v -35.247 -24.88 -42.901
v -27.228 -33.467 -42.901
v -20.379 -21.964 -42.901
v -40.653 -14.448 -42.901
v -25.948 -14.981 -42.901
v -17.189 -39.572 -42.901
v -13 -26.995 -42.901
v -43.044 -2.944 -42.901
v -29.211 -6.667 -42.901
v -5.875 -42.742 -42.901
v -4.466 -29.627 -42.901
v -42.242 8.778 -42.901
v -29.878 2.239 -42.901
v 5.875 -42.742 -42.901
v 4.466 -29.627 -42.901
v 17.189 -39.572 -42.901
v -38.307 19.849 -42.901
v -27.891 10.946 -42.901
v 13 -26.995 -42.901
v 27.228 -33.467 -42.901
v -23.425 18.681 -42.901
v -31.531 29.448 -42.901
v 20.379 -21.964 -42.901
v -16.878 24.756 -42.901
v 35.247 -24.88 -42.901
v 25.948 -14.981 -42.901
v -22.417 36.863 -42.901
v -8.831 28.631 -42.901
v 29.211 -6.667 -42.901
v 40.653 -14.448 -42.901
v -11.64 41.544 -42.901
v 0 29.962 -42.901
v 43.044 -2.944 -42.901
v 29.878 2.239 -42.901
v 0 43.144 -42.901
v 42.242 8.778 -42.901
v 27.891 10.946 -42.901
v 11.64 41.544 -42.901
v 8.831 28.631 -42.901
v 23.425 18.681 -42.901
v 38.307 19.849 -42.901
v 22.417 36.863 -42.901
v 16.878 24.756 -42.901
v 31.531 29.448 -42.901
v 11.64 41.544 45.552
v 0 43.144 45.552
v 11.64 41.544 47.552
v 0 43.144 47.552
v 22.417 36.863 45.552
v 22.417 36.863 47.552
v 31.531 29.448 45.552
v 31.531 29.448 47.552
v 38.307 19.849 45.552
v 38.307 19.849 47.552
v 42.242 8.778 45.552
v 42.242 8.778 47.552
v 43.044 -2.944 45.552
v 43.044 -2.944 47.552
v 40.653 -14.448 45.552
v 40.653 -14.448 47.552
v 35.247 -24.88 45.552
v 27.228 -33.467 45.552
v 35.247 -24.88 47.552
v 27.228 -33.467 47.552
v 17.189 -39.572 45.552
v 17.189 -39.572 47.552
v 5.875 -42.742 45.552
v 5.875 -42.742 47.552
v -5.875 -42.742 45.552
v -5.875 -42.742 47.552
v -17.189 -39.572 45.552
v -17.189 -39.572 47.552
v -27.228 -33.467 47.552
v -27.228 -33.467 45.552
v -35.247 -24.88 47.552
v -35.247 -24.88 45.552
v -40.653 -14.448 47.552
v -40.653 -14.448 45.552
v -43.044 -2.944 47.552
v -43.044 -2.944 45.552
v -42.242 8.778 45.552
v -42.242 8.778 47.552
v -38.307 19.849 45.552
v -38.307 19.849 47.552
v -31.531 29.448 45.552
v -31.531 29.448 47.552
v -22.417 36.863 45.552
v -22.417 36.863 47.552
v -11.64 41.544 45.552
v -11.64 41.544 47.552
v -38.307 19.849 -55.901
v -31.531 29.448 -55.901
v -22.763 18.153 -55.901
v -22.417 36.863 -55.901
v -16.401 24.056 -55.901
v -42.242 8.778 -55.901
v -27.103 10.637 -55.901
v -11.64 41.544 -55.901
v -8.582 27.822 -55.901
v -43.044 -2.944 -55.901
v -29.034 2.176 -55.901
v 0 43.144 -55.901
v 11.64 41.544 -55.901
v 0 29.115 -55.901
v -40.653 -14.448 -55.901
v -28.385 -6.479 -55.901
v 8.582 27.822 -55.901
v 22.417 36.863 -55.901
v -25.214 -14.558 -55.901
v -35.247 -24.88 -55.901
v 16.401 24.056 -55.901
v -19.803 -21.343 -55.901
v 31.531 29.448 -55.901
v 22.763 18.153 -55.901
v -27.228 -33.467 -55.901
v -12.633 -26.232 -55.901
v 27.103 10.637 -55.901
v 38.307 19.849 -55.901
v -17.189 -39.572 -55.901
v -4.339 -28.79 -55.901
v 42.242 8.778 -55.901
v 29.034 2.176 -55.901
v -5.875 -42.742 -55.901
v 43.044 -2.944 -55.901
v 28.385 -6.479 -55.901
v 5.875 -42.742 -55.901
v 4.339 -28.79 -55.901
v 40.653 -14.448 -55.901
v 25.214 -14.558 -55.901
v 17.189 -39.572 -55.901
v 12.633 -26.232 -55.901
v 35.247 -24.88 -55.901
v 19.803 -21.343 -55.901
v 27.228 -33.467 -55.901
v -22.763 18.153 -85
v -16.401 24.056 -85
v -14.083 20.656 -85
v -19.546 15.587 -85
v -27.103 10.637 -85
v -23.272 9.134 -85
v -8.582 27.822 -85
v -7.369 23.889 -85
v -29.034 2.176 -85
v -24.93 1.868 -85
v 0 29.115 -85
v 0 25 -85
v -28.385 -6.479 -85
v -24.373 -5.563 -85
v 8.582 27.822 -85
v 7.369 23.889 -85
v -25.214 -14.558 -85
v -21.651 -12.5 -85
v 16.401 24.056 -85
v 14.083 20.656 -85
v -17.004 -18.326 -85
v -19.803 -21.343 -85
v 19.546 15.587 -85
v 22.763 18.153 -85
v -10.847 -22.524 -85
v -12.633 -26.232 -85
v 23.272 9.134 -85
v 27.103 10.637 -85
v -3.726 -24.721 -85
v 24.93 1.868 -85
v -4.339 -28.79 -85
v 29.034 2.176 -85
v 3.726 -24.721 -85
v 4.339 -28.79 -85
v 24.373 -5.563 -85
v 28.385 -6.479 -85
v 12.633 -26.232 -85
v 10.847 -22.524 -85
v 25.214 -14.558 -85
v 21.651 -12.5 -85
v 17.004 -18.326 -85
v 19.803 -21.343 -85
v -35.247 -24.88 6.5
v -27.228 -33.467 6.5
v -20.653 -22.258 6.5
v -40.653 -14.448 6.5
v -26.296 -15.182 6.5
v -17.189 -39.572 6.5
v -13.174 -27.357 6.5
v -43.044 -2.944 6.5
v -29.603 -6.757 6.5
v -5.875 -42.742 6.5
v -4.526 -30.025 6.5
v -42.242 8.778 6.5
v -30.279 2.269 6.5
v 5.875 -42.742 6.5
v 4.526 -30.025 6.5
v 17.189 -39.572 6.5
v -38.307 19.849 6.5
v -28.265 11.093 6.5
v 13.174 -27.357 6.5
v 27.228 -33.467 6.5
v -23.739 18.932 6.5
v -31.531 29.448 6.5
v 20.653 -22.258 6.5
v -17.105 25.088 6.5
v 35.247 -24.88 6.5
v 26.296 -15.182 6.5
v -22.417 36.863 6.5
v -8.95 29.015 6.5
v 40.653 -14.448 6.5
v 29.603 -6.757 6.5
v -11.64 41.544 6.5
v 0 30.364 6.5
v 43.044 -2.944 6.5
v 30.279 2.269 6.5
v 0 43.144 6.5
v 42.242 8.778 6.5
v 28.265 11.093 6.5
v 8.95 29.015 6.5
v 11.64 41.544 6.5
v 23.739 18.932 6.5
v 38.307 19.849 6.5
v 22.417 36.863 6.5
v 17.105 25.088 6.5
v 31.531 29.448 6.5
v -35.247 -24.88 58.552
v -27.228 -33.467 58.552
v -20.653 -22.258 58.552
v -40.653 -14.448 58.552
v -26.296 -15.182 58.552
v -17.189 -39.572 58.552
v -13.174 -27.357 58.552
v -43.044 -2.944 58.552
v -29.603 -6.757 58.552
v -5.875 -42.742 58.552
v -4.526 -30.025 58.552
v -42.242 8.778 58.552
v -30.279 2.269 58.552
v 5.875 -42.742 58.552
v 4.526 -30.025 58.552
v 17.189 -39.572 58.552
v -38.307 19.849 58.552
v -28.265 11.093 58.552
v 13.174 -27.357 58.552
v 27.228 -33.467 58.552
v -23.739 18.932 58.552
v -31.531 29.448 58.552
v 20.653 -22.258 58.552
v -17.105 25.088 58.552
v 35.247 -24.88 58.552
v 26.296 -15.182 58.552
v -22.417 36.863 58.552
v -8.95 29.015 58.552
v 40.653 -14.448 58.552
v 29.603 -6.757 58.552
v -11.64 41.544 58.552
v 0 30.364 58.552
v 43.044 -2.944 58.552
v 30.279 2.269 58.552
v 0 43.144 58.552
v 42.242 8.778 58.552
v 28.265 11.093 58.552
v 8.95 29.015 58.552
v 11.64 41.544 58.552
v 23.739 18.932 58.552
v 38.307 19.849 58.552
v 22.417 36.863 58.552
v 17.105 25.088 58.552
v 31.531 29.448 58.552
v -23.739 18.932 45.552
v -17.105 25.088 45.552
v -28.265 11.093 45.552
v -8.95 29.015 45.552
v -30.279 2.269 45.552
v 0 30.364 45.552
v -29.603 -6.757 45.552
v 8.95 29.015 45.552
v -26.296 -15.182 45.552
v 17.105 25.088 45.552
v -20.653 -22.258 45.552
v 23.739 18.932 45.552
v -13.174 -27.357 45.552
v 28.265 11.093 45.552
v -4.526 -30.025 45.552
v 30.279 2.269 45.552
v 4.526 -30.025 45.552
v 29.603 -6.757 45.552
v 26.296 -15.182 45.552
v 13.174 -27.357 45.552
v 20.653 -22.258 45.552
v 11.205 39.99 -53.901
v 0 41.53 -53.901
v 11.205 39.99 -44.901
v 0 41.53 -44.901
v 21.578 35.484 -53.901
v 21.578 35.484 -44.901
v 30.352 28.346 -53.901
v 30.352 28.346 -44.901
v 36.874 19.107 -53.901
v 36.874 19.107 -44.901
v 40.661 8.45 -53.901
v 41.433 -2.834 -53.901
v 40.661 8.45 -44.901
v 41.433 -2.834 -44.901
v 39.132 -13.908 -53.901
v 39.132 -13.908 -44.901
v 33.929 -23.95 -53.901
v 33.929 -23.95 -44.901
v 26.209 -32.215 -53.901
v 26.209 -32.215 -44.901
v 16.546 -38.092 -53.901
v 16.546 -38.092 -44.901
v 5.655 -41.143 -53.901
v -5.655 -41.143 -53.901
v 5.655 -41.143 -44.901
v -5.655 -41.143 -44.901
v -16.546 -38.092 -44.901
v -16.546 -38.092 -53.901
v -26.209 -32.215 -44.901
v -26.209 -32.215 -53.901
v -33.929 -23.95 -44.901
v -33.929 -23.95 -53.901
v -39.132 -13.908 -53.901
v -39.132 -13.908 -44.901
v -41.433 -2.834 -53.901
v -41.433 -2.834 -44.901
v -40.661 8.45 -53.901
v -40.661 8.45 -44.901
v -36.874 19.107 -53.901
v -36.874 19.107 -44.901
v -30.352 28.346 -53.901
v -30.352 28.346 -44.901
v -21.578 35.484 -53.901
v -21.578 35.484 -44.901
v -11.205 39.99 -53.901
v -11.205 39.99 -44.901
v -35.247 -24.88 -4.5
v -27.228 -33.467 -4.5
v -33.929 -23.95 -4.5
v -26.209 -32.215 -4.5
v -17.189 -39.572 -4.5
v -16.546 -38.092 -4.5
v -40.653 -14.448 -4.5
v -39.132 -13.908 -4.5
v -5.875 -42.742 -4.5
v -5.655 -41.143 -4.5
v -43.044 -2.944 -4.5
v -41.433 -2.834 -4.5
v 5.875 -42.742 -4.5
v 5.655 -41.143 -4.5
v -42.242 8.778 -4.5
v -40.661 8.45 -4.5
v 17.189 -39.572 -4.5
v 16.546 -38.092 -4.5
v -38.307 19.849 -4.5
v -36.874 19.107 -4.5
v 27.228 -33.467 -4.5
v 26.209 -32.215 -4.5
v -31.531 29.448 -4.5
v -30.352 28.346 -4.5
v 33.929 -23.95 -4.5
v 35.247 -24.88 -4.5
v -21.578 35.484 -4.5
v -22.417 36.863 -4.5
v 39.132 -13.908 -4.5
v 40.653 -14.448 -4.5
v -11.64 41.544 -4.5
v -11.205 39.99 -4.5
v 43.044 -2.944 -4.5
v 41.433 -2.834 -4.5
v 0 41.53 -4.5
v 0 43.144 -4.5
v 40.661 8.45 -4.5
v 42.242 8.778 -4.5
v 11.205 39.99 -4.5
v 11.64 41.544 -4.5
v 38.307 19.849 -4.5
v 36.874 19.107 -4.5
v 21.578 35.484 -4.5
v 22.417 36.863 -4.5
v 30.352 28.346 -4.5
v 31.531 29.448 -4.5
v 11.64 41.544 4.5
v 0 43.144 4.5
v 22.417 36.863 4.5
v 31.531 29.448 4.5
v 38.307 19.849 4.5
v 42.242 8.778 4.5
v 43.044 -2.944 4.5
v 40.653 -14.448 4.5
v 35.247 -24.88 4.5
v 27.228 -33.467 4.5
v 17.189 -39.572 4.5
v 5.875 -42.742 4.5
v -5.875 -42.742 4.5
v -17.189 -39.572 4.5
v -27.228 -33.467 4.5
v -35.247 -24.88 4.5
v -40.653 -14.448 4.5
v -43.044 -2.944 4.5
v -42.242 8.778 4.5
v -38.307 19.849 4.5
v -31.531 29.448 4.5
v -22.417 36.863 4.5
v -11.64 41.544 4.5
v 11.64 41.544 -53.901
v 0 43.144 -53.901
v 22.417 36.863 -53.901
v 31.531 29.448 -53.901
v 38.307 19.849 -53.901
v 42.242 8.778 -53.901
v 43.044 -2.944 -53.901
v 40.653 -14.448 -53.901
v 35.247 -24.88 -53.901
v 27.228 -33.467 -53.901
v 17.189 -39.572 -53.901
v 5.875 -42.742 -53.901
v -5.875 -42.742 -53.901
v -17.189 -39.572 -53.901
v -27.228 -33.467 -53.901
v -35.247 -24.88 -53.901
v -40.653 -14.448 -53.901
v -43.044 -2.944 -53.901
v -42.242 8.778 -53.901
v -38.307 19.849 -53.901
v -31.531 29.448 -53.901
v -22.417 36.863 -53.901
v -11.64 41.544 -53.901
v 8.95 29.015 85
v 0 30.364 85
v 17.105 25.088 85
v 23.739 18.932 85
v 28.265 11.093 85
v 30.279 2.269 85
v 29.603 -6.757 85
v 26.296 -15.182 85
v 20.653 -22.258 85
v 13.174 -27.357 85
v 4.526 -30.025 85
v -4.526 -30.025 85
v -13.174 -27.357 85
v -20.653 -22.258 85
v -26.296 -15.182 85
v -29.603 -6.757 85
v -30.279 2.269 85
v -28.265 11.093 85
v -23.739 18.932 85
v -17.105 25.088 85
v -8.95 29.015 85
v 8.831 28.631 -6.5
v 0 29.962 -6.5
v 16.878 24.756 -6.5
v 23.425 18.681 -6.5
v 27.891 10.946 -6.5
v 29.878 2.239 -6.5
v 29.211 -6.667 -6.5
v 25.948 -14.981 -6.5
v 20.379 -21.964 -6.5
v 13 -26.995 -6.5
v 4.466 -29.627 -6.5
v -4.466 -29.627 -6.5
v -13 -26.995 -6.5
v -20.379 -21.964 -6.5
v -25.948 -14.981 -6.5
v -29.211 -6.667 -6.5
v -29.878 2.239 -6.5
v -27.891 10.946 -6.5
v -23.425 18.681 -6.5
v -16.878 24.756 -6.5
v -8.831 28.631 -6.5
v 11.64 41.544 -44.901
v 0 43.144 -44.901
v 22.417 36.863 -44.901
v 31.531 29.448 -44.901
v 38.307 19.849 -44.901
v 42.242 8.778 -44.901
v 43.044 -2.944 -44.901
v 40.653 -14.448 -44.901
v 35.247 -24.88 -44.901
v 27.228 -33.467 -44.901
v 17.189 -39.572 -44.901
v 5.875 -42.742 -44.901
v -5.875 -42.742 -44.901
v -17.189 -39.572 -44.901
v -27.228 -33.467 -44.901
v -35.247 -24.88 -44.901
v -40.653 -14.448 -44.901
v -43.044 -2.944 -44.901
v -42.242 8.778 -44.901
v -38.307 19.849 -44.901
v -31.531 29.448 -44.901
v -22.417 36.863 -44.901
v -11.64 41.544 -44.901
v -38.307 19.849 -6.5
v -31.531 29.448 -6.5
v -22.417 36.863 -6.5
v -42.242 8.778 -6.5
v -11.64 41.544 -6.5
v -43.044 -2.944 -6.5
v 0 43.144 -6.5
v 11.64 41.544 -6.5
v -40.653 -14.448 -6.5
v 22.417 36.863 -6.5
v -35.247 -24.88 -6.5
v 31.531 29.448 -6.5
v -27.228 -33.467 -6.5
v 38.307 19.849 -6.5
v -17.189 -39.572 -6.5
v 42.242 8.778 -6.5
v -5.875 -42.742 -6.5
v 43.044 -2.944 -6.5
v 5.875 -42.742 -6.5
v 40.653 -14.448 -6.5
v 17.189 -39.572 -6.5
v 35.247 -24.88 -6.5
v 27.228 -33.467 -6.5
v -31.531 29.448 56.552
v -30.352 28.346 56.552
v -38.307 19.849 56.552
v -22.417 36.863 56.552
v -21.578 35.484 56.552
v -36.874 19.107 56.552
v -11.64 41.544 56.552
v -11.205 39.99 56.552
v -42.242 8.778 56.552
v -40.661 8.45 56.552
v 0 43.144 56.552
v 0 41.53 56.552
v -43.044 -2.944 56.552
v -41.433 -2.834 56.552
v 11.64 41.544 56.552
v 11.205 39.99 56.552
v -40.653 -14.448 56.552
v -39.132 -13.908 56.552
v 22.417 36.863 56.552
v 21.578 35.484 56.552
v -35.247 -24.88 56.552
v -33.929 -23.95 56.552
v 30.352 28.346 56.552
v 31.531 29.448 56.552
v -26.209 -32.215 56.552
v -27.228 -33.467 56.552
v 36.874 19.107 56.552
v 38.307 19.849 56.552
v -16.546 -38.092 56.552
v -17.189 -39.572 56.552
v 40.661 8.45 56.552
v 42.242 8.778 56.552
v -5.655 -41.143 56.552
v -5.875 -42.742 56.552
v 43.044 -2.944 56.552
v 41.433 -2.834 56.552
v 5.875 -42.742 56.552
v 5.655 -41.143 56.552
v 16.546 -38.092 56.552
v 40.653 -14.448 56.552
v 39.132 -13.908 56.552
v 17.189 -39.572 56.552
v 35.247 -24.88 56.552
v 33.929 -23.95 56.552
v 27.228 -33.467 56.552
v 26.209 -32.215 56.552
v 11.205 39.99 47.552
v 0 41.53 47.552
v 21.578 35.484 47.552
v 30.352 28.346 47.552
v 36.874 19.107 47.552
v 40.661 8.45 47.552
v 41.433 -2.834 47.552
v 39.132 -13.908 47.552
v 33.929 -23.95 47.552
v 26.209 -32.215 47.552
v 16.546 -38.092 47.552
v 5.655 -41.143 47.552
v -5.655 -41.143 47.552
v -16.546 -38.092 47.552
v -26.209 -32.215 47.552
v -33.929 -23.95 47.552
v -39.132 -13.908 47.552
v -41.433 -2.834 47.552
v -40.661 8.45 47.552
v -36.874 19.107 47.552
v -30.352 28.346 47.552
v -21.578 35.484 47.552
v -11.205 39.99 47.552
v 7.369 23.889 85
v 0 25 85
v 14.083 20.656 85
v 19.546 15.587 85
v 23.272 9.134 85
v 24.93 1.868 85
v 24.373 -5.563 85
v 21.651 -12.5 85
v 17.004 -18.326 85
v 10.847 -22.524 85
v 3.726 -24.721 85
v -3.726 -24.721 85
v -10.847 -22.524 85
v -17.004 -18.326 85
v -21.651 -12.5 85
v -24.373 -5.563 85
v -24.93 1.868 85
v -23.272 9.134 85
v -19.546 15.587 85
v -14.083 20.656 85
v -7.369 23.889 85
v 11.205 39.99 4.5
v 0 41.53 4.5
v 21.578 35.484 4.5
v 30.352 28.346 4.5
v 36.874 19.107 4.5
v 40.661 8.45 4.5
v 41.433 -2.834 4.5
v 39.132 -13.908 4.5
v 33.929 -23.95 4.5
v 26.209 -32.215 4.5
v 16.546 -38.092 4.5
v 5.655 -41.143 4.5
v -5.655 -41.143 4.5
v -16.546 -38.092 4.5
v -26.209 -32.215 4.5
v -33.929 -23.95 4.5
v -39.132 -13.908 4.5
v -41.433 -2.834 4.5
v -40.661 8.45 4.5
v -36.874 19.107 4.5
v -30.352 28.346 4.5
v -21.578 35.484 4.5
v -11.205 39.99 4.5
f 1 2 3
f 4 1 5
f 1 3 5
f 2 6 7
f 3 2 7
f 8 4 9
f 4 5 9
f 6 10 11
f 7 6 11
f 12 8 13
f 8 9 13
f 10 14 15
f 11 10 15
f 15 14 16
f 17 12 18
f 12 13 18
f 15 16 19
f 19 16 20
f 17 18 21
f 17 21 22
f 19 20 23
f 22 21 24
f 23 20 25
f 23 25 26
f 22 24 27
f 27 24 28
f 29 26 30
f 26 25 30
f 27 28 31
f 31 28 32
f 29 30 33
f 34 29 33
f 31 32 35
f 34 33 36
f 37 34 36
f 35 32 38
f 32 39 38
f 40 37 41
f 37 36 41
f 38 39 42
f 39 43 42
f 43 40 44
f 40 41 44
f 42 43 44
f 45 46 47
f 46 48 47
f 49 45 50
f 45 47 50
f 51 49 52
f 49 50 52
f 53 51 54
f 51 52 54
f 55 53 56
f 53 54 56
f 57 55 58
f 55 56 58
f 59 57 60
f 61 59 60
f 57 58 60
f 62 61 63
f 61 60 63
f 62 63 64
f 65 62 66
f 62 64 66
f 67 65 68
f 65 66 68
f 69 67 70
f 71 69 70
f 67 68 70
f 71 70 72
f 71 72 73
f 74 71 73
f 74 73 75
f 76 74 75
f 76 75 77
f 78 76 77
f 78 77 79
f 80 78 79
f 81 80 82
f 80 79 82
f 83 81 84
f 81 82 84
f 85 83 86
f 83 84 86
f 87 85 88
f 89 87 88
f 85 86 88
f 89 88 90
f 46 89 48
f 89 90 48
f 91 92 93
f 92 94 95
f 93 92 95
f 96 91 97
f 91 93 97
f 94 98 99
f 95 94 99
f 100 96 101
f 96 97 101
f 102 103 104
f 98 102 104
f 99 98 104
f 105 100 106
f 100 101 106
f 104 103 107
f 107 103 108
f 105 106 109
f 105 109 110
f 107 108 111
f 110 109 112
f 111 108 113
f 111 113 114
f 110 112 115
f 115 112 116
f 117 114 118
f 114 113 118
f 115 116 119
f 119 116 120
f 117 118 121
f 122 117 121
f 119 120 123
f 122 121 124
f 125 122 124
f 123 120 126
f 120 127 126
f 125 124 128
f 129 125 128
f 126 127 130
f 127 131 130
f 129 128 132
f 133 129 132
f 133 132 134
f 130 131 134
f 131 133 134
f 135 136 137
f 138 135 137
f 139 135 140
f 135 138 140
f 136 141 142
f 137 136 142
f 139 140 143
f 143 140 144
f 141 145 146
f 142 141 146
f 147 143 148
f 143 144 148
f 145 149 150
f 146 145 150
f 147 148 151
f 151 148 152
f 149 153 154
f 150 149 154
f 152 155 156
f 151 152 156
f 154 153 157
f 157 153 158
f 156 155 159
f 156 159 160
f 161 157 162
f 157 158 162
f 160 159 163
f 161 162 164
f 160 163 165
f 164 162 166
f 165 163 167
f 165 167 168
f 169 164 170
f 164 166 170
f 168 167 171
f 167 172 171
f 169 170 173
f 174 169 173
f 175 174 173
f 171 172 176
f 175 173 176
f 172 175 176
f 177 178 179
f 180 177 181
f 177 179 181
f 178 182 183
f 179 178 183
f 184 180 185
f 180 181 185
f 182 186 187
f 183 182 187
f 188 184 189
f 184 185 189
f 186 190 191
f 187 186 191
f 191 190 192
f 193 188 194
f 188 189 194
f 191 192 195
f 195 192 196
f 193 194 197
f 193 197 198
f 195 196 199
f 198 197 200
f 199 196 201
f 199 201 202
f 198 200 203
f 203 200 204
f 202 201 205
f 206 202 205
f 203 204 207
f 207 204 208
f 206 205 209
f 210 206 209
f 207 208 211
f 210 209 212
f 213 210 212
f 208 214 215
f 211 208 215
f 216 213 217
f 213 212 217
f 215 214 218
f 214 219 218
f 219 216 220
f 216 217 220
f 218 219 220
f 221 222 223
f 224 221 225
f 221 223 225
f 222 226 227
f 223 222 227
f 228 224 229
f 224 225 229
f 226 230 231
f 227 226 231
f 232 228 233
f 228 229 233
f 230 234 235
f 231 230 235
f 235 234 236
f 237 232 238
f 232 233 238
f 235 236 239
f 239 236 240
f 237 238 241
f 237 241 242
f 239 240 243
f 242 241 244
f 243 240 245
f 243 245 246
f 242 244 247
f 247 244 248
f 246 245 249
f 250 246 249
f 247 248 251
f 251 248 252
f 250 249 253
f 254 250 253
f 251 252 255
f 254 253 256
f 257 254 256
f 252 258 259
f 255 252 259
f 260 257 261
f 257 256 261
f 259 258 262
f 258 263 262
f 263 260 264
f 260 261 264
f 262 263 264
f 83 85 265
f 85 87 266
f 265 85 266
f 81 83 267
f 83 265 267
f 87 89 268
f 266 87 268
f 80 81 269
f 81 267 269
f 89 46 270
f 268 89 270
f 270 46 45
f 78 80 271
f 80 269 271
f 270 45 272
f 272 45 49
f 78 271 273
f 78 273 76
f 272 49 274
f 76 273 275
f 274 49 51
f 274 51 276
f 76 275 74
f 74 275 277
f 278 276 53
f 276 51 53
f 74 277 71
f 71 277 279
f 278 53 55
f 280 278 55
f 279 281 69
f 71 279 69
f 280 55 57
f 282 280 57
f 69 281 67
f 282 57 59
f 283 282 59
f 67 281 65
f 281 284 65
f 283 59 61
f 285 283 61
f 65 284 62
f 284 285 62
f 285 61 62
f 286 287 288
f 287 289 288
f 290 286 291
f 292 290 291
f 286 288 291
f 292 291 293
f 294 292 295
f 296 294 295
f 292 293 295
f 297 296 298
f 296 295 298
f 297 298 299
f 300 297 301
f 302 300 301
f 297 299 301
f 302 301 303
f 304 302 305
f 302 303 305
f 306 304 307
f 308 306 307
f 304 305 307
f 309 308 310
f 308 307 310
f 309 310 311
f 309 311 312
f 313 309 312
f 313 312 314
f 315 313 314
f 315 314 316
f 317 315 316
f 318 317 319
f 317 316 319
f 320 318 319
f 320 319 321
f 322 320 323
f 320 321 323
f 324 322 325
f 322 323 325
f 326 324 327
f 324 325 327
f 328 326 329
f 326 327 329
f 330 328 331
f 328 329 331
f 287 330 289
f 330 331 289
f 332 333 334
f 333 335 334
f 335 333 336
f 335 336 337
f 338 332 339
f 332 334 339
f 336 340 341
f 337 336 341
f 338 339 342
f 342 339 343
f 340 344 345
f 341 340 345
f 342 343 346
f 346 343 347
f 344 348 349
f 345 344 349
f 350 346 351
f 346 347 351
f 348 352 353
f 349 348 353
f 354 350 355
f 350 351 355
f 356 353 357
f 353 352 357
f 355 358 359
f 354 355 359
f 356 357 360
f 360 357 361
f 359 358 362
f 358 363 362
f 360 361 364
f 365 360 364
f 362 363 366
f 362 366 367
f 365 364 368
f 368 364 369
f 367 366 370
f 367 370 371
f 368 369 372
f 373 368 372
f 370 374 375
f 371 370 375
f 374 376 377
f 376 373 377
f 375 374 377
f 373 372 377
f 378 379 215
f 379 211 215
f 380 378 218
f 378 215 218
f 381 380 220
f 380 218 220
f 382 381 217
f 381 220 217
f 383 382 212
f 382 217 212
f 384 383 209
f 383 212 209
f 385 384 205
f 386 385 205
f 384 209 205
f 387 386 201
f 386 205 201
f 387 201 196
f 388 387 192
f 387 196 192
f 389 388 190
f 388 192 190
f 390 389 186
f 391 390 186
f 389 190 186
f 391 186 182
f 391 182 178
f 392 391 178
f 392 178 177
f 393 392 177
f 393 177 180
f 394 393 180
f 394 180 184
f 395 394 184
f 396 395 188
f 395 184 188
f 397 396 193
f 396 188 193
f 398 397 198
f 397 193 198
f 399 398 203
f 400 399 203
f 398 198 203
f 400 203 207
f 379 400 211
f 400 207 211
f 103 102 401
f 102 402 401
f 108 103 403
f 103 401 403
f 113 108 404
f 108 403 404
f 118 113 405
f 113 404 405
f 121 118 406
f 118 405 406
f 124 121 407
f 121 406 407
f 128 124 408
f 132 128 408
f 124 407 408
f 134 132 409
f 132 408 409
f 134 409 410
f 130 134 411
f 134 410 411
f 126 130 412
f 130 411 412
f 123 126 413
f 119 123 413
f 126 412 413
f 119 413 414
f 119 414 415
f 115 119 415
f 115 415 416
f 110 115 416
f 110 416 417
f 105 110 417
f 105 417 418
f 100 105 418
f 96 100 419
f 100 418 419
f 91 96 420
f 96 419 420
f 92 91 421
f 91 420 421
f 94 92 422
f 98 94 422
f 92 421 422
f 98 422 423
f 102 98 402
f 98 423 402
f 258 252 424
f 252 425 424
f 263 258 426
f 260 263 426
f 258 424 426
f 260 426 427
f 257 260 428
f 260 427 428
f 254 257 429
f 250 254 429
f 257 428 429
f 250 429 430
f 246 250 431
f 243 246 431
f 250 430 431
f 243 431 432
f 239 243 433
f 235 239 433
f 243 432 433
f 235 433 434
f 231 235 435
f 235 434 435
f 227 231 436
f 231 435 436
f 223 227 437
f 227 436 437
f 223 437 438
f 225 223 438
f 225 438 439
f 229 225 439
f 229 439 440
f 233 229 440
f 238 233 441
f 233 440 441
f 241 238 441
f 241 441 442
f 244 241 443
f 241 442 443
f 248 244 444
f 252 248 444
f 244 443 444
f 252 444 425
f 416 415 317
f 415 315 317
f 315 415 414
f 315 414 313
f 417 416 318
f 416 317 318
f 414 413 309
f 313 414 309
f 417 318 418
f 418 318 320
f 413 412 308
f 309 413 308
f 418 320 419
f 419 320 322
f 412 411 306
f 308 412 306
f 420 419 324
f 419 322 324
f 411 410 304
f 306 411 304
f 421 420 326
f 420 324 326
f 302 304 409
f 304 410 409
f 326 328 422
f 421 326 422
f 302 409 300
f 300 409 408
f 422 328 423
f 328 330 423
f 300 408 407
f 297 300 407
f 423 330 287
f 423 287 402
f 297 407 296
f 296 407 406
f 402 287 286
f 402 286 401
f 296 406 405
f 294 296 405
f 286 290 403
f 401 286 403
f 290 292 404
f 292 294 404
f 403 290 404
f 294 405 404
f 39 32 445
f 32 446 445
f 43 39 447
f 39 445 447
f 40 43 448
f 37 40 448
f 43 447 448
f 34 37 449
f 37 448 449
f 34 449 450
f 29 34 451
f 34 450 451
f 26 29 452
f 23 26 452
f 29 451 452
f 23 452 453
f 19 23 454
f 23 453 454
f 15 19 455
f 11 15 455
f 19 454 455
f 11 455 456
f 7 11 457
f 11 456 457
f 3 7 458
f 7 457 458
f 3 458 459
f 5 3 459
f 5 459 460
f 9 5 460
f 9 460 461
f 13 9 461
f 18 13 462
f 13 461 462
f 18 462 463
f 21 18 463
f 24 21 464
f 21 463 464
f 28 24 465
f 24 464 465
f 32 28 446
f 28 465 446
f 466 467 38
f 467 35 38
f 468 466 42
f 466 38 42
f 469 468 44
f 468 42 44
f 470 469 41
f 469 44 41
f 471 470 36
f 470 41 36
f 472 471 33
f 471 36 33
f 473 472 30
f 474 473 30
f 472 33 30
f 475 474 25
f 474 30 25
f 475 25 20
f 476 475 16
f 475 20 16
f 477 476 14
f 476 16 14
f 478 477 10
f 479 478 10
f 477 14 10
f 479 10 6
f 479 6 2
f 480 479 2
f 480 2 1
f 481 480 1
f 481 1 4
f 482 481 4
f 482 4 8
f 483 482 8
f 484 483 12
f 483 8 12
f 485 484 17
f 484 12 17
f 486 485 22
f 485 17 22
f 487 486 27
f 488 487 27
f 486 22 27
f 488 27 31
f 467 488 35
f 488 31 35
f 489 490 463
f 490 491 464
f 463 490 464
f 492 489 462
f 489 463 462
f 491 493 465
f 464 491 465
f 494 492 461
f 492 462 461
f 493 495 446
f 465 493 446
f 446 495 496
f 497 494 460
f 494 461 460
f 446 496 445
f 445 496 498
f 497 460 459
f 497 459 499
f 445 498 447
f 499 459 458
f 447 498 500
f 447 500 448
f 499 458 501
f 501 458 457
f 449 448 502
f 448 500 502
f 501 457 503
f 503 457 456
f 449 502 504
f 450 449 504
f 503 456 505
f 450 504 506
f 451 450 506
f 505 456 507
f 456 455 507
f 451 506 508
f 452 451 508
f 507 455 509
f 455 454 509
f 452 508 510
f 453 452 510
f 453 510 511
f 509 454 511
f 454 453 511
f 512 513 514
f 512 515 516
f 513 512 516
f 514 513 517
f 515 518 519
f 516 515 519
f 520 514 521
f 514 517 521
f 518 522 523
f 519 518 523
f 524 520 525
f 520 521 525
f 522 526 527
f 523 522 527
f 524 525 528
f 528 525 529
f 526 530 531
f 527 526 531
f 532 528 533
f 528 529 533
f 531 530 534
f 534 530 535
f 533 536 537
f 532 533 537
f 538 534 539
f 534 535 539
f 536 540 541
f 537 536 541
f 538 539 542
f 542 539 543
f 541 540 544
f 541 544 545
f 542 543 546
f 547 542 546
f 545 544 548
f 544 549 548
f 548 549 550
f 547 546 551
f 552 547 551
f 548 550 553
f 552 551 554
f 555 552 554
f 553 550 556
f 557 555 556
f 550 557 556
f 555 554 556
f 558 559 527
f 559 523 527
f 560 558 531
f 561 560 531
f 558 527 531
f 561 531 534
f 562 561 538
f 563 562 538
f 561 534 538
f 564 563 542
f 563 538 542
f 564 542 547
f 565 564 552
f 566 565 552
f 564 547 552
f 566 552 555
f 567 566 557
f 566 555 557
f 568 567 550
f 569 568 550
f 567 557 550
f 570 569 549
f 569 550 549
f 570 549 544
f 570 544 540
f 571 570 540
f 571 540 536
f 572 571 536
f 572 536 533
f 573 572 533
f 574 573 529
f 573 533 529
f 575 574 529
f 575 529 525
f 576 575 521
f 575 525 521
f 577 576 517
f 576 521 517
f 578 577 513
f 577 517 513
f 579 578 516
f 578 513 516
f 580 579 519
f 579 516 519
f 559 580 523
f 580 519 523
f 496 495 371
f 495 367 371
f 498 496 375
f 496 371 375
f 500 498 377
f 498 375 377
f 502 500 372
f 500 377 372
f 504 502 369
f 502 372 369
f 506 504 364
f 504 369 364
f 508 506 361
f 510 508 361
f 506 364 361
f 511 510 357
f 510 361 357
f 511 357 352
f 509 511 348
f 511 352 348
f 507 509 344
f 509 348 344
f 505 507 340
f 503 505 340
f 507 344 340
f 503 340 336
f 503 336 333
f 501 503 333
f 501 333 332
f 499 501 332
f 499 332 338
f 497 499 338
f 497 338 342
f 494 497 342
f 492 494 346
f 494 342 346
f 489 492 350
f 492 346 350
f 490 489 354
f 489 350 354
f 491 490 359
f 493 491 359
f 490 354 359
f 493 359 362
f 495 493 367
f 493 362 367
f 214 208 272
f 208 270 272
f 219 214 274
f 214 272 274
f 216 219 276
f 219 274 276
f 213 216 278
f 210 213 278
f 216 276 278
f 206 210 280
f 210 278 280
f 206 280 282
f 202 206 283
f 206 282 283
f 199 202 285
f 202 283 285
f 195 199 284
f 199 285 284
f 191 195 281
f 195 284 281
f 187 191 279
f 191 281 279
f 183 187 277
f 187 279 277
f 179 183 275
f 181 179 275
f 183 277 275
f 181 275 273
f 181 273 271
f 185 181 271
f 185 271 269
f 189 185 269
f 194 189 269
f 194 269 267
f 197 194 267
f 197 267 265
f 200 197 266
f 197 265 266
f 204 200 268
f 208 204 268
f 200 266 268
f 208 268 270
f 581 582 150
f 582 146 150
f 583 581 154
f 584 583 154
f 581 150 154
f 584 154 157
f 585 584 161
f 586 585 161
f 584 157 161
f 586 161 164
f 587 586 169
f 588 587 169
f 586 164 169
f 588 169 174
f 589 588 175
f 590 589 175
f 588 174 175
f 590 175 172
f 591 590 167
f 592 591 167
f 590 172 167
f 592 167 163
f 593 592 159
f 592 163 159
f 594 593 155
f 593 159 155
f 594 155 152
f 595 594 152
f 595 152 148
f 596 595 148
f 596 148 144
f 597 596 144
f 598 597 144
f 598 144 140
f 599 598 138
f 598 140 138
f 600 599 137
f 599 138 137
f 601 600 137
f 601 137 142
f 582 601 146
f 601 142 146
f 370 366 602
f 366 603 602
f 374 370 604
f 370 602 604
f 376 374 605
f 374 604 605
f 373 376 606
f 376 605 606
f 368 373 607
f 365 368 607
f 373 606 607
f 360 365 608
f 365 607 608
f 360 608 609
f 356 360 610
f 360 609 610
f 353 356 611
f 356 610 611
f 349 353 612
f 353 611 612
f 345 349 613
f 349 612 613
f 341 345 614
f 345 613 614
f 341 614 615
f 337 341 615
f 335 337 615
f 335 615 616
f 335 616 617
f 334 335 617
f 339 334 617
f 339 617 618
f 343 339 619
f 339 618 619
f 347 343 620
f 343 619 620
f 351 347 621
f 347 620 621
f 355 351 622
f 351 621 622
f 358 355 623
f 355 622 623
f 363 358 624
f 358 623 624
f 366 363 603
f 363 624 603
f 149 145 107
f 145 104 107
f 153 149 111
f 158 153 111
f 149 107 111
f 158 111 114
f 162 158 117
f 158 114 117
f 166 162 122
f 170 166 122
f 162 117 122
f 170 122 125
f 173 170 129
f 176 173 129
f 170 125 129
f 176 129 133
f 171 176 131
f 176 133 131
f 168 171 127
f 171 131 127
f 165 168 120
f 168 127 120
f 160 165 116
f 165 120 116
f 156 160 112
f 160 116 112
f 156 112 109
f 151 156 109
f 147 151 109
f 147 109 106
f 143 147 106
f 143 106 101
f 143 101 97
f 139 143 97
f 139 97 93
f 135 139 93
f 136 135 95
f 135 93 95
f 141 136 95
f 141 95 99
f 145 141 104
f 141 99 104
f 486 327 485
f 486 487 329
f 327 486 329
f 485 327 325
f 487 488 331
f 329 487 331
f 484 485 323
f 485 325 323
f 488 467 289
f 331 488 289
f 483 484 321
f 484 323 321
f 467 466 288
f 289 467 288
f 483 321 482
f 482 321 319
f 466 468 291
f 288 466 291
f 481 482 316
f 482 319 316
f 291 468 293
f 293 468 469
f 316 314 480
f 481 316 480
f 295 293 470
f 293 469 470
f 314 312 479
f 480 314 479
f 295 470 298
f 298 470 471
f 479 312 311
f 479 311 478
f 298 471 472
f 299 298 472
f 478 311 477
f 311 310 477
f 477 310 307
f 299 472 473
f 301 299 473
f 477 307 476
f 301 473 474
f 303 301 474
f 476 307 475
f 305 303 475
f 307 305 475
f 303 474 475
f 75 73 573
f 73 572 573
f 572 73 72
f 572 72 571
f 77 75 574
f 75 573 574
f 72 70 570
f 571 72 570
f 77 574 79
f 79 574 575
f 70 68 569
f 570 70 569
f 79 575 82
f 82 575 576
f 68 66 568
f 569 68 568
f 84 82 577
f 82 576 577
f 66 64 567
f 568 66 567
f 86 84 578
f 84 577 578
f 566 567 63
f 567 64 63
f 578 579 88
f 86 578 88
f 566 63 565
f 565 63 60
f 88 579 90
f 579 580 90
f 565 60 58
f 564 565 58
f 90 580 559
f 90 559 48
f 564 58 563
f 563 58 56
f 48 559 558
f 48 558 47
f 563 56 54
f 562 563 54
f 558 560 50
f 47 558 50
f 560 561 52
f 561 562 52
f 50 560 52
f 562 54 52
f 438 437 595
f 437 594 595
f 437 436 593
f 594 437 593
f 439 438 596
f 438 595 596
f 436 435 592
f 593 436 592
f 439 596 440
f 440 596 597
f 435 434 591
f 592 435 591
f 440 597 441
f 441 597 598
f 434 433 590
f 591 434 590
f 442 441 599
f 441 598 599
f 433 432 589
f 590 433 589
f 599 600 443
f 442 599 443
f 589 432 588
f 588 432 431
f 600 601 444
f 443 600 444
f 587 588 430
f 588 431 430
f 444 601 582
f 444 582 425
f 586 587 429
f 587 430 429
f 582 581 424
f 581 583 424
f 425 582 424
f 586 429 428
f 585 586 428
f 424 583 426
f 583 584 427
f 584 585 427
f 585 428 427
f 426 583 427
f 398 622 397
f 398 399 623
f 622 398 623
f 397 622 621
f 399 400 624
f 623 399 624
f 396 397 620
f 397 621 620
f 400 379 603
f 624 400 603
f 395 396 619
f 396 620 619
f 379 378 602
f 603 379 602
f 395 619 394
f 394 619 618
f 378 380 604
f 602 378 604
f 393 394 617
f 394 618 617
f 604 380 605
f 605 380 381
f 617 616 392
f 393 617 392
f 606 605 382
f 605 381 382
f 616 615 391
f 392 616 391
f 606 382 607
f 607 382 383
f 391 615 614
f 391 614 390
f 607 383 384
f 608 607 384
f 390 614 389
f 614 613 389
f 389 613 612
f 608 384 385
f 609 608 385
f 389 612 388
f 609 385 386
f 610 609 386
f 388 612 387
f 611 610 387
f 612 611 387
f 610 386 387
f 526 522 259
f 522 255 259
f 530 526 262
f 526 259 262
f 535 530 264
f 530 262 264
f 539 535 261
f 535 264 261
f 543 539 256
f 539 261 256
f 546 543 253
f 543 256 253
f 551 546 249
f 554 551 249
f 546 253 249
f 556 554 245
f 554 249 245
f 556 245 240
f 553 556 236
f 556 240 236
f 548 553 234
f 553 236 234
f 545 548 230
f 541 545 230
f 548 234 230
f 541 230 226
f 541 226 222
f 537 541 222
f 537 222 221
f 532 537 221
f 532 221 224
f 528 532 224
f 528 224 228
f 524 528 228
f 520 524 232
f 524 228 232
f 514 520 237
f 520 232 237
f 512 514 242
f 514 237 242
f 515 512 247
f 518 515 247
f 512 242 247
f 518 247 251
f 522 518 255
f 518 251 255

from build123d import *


with BuildPart() as part:
    # Sketch1 → Revolve2 (revolve)
    with BuildSketch(Plane(origin=(0, 0, 0), x_dir=(0, 0, -1), z_dir=(1, 0, 0))):
        Polygon((-85, 25), (85, 25), (85, 29.115175046), (55.901270972, 29.115175046), (55.901270972, 43.144153468), (53.901270972, 43.144153468), (53.901270972, 41.530001869), (44.901270972, 41.530001869), (44.901270972, 43.144153468), (42.901270972, 43.144153468), (42.901270972, 29.961940535), (6.5, 29.961940535), (6.5, 43.144153468), (4.5, 43.144153468), (4.5, 41.530001869), (-4.5, 41.530001869), (-4.5, 43.144153468), (-6.5, 43.144153468), (-6.5, 30.363940149), (-45.552167267, 30.363940149), (-45.552167267, 43.144153468), (-47.552167267, 43.144153468), (-47.552167267, 41.530001869), (-56.552167267, 41.530001869), (-56.552167267, 43.144153468), (-58.552167267, 43.144153468), (-58.552167267, 30.363940149), (-85, 30.363940149), align=None)
    revolve(axis=Axis((0, 0, 119.060774984), (0, 0, -1)))


solid = part.part
